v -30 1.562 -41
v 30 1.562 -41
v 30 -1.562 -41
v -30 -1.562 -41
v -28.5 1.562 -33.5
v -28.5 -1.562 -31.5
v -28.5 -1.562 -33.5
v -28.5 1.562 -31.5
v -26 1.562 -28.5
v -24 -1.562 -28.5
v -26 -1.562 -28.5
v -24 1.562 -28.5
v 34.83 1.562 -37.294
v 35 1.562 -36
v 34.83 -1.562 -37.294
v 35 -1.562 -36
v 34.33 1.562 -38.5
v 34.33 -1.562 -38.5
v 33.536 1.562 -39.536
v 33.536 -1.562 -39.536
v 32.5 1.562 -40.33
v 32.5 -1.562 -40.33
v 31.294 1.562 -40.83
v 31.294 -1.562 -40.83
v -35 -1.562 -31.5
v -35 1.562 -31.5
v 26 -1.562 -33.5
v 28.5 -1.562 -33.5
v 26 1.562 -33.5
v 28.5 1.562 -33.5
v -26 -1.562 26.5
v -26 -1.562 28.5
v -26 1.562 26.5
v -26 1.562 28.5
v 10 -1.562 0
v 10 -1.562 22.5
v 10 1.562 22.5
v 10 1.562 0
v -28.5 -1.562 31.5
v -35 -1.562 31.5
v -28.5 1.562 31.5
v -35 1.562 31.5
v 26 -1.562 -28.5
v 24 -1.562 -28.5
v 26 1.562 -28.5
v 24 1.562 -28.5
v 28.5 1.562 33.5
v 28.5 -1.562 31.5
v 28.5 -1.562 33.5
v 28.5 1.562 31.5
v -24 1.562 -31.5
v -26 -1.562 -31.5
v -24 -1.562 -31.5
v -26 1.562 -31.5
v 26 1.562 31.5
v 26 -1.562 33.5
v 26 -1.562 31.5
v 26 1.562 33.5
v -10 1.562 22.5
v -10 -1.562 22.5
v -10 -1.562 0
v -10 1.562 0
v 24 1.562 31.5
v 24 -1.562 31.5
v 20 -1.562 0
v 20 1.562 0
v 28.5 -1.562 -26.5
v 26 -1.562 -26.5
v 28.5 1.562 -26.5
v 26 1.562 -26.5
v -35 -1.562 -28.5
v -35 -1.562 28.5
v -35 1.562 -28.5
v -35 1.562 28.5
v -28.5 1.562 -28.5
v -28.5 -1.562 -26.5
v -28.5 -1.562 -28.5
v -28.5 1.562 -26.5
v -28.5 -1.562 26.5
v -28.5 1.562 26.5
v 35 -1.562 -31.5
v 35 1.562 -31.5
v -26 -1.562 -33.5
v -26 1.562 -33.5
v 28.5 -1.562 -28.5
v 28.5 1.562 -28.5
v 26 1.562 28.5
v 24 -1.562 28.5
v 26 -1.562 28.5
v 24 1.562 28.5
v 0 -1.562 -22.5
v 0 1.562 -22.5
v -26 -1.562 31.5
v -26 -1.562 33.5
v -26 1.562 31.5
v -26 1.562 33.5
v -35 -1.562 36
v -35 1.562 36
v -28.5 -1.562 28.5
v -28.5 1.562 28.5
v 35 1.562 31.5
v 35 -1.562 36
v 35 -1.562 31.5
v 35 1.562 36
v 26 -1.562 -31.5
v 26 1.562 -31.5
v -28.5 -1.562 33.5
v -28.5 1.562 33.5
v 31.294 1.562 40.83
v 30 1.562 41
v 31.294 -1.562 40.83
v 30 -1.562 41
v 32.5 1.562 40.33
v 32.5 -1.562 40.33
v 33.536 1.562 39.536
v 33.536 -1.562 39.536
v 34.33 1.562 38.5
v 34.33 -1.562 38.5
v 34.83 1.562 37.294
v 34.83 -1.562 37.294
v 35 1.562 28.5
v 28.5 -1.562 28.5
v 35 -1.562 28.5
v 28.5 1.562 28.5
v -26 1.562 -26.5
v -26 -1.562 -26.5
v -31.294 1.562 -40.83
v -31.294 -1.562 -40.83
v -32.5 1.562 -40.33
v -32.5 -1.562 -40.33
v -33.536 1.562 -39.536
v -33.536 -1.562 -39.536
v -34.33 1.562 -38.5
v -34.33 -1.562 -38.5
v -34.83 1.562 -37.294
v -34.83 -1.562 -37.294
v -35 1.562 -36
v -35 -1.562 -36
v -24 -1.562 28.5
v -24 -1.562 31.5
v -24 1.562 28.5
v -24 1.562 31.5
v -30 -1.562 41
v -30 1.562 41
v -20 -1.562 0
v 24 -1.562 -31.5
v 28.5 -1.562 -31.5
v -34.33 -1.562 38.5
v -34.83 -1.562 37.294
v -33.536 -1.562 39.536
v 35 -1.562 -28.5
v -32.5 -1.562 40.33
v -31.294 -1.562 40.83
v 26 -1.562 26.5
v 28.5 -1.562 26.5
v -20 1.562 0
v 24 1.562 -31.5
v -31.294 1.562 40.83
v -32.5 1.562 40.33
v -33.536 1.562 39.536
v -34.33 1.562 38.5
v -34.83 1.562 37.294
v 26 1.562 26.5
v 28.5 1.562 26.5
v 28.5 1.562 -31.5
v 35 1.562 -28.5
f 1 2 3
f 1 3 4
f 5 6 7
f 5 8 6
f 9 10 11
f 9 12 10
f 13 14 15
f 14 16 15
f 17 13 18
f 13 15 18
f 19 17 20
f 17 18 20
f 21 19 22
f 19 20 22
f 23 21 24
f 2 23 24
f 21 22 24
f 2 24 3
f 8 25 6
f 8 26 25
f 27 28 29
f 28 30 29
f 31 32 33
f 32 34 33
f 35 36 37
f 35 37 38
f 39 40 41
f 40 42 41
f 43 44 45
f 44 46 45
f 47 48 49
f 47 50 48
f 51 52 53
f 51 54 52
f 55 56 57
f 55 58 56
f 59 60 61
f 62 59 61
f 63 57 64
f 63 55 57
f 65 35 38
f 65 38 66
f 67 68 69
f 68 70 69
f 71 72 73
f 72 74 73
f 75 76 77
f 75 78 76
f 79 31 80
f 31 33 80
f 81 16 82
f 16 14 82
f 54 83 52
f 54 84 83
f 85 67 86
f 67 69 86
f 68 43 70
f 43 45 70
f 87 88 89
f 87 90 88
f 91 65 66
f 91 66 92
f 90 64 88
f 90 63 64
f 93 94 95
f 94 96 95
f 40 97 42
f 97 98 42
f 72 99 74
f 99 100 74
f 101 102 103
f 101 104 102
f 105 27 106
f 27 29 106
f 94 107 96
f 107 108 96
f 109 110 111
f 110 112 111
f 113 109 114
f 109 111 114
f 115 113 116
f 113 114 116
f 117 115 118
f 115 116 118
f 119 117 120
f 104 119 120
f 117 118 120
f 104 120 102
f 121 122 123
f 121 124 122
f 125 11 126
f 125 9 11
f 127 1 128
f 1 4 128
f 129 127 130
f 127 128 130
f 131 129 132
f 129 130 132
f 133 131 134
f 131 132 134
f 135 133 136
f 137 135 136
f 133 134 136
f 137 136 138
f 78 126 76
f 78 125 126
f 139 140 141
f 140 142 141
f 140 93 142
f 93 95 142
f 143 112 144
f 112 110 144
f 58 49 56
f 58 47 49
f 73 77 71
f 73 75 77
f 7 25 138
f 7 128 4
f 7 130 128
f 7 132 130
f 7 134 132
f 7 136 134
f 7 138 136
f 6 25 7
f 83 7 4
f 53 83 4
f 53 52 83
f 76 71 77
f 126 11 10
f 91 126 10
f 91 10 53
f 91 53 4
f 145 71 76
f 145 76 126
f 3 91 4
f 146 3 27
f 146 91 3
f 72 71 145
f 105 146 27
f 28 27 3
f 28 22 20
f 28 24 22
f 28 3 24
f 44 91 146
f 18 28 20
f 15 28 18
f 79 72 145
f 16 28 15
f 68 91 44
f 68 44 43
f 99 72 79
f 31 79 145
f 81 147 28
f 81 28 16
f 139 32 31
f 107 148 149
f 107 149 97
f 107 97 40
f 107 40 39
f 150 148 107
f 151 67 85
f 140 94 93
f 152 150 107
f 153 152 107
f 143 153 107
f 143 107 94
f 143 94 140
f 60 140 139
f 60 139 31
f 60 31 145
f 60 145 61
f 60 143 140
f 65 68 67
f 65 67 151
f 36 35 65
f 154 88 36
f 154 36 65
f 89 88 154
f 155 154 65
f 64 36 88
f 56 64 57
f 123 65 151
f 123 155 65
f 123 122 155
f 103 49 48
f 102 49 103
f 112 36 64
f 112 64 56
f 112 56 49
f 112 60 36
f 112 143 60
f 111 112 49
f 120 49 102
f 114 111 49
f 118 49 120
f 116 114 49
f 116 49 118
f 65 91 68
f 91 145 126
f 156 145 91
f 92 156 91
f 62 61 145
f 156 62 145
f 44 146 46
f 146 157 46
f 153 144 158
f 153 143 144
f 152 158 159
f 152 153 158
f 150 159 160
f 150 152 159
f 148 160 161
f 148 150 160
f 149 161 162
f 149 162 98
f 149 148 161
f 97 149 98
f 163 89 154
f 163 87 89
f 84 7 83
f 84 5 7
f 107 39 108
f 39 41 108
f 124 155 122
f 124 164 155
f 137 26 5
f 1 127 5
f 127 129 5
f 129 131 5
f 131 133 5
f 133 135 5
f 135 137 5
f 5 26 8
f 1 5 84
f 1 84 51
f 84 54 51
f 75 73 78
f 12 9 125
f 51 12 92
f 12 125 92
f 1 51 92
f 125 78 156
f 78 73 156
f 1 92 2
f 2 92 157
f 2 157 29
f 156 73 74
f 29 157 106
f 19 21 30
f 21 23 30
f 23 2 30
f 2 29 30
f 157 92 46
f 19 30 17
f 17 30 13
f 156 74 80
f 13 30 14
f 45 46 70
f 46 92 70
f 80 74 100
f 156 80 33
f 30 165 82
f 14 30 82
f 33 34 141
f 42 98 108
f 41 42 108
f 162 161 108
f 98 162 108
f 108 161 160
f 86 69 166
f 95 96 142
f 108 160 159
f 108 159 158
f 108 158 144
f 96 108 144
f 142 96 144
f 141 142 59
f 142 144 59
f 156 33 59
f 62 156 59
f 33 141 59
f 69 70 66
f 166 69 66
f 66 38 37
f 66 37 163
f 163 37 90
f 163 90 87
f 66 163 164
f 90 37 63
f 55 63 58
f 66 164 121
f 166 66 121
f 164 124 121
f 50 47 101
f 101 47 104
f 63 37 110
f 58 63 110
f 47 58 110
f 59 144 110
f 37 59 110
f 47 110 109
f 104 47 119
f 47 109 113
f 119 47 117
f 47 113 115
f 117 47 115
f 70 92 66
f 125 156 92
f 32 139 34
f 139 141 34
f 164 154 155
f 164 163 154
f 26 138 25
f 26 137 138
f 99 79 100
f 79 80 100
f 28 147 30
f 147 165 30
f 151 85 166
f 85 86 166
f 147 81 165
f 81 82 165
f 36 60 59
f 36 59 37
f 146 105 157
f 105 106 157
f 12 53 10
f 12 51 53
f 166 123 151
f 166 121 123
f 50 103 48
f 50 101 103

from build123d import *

# Parameters (mm, degrees)
BOSS_EXTRUDE1_DEPTH  = 1.5625
MIRROR4_COPY_1_DEPTH = 1.5625
FILLET1_R            = 5
CUT_EXTRUDE1_START   = -4.125
CUT_EXTRUDE1_DEPTH   = 5.125


with BuildPart() as part:
    # Sketch1 → Boss-Extrude1 (new body, symmetric)
    with BuildSketch(Plane(origin=(0, 0, 0), x_dir=(1, 0, 0), z_dir=(0, 1, 0))):
        Polygon((0, 41), (35, 41), (35, 31.5), (28.5, 31.5), (28.5, 33.5), (26, 33.5), (26, 31.5), (24, 31.5), (24, 28.5), (26, 28.5), (26, 26.5), (28.5, 26.5), (28.5, 28.5), (35, 28.5), (35, 0), (0, 0), align=None)
    boss_extrude1 = extrude(amount=BOSS_EXTRUDE1_DEPTH, both=True)

    # Mirror1: Boss-Extrude1 across plane
    add(boss_extrude1.mirror(Plane(origin=(0, 0, 0), x_dir=(0, 0, 1), z_dir=(1, 0, 0))))

    # Mirror4: Boss-Extrude1 across plane
    add(boss_extrude1.mirror(Plane.XY))

    # Mirror4 copy 1 sketch → Mirror4 copy 1 (add, symmetric)
    with BuildSketch(Plane(origin=(0, 0, 0), x_dir=(-1, 0, 0), z_dir=(0, 1, 0))):
        Polygon((0, 41), (35, 41), (35, 31.5), (28.5, 31.5), (28.5, 33.5), (26, 33.5), (26, 31.5), (24, 31.5), (24, 28.5), (26, 28.5), (26, 26.5), (28.5, 26.5), (28.5, 28.5), (35, 28.5), (35, 0), (0, 0), align=None)
    extrude(amount=MIRROR4_COPY_1_DEPTH, both=True)

    # Fillet1
    fillet1_edges = [part.edges().sort_by_distance(p)[0] for p in [
        (35, 0, 41),
        (35, 0, -41),
        (-35, 0, -41),
        (-35, 0, 41),
    ]]
    fillet(fillet1_edges, radius=FILLET1_R)

    # Sketch2 → Cut-Extrude1 (cut)
    with BuildSketch(Plane(origin=(0, 1.5625, 0), x_dir=(1, 0, 0), z_dir=(0, 1, 0)).offset(CUT_EXTRUDE1_START)):
        Polygon((0, 22.5), (0, -22.5), (-10, -22.5), (-10, 0), (-20, 0), align=None)
    cut_extrude1 = extrude(amount=CUT_EXTRUDE1_DEPTH, mode=Mode.SUBTRACT)

    # Mirror5: Cut-Extrude1 across plane
    add(cut_extrude1.mirror(Plane(origin=(0, 0, 0), x_dir=(0, 0, 1), z_dir=(1, 0, 0))), mode=Mode.SUBTRACT)


solid = part.part
